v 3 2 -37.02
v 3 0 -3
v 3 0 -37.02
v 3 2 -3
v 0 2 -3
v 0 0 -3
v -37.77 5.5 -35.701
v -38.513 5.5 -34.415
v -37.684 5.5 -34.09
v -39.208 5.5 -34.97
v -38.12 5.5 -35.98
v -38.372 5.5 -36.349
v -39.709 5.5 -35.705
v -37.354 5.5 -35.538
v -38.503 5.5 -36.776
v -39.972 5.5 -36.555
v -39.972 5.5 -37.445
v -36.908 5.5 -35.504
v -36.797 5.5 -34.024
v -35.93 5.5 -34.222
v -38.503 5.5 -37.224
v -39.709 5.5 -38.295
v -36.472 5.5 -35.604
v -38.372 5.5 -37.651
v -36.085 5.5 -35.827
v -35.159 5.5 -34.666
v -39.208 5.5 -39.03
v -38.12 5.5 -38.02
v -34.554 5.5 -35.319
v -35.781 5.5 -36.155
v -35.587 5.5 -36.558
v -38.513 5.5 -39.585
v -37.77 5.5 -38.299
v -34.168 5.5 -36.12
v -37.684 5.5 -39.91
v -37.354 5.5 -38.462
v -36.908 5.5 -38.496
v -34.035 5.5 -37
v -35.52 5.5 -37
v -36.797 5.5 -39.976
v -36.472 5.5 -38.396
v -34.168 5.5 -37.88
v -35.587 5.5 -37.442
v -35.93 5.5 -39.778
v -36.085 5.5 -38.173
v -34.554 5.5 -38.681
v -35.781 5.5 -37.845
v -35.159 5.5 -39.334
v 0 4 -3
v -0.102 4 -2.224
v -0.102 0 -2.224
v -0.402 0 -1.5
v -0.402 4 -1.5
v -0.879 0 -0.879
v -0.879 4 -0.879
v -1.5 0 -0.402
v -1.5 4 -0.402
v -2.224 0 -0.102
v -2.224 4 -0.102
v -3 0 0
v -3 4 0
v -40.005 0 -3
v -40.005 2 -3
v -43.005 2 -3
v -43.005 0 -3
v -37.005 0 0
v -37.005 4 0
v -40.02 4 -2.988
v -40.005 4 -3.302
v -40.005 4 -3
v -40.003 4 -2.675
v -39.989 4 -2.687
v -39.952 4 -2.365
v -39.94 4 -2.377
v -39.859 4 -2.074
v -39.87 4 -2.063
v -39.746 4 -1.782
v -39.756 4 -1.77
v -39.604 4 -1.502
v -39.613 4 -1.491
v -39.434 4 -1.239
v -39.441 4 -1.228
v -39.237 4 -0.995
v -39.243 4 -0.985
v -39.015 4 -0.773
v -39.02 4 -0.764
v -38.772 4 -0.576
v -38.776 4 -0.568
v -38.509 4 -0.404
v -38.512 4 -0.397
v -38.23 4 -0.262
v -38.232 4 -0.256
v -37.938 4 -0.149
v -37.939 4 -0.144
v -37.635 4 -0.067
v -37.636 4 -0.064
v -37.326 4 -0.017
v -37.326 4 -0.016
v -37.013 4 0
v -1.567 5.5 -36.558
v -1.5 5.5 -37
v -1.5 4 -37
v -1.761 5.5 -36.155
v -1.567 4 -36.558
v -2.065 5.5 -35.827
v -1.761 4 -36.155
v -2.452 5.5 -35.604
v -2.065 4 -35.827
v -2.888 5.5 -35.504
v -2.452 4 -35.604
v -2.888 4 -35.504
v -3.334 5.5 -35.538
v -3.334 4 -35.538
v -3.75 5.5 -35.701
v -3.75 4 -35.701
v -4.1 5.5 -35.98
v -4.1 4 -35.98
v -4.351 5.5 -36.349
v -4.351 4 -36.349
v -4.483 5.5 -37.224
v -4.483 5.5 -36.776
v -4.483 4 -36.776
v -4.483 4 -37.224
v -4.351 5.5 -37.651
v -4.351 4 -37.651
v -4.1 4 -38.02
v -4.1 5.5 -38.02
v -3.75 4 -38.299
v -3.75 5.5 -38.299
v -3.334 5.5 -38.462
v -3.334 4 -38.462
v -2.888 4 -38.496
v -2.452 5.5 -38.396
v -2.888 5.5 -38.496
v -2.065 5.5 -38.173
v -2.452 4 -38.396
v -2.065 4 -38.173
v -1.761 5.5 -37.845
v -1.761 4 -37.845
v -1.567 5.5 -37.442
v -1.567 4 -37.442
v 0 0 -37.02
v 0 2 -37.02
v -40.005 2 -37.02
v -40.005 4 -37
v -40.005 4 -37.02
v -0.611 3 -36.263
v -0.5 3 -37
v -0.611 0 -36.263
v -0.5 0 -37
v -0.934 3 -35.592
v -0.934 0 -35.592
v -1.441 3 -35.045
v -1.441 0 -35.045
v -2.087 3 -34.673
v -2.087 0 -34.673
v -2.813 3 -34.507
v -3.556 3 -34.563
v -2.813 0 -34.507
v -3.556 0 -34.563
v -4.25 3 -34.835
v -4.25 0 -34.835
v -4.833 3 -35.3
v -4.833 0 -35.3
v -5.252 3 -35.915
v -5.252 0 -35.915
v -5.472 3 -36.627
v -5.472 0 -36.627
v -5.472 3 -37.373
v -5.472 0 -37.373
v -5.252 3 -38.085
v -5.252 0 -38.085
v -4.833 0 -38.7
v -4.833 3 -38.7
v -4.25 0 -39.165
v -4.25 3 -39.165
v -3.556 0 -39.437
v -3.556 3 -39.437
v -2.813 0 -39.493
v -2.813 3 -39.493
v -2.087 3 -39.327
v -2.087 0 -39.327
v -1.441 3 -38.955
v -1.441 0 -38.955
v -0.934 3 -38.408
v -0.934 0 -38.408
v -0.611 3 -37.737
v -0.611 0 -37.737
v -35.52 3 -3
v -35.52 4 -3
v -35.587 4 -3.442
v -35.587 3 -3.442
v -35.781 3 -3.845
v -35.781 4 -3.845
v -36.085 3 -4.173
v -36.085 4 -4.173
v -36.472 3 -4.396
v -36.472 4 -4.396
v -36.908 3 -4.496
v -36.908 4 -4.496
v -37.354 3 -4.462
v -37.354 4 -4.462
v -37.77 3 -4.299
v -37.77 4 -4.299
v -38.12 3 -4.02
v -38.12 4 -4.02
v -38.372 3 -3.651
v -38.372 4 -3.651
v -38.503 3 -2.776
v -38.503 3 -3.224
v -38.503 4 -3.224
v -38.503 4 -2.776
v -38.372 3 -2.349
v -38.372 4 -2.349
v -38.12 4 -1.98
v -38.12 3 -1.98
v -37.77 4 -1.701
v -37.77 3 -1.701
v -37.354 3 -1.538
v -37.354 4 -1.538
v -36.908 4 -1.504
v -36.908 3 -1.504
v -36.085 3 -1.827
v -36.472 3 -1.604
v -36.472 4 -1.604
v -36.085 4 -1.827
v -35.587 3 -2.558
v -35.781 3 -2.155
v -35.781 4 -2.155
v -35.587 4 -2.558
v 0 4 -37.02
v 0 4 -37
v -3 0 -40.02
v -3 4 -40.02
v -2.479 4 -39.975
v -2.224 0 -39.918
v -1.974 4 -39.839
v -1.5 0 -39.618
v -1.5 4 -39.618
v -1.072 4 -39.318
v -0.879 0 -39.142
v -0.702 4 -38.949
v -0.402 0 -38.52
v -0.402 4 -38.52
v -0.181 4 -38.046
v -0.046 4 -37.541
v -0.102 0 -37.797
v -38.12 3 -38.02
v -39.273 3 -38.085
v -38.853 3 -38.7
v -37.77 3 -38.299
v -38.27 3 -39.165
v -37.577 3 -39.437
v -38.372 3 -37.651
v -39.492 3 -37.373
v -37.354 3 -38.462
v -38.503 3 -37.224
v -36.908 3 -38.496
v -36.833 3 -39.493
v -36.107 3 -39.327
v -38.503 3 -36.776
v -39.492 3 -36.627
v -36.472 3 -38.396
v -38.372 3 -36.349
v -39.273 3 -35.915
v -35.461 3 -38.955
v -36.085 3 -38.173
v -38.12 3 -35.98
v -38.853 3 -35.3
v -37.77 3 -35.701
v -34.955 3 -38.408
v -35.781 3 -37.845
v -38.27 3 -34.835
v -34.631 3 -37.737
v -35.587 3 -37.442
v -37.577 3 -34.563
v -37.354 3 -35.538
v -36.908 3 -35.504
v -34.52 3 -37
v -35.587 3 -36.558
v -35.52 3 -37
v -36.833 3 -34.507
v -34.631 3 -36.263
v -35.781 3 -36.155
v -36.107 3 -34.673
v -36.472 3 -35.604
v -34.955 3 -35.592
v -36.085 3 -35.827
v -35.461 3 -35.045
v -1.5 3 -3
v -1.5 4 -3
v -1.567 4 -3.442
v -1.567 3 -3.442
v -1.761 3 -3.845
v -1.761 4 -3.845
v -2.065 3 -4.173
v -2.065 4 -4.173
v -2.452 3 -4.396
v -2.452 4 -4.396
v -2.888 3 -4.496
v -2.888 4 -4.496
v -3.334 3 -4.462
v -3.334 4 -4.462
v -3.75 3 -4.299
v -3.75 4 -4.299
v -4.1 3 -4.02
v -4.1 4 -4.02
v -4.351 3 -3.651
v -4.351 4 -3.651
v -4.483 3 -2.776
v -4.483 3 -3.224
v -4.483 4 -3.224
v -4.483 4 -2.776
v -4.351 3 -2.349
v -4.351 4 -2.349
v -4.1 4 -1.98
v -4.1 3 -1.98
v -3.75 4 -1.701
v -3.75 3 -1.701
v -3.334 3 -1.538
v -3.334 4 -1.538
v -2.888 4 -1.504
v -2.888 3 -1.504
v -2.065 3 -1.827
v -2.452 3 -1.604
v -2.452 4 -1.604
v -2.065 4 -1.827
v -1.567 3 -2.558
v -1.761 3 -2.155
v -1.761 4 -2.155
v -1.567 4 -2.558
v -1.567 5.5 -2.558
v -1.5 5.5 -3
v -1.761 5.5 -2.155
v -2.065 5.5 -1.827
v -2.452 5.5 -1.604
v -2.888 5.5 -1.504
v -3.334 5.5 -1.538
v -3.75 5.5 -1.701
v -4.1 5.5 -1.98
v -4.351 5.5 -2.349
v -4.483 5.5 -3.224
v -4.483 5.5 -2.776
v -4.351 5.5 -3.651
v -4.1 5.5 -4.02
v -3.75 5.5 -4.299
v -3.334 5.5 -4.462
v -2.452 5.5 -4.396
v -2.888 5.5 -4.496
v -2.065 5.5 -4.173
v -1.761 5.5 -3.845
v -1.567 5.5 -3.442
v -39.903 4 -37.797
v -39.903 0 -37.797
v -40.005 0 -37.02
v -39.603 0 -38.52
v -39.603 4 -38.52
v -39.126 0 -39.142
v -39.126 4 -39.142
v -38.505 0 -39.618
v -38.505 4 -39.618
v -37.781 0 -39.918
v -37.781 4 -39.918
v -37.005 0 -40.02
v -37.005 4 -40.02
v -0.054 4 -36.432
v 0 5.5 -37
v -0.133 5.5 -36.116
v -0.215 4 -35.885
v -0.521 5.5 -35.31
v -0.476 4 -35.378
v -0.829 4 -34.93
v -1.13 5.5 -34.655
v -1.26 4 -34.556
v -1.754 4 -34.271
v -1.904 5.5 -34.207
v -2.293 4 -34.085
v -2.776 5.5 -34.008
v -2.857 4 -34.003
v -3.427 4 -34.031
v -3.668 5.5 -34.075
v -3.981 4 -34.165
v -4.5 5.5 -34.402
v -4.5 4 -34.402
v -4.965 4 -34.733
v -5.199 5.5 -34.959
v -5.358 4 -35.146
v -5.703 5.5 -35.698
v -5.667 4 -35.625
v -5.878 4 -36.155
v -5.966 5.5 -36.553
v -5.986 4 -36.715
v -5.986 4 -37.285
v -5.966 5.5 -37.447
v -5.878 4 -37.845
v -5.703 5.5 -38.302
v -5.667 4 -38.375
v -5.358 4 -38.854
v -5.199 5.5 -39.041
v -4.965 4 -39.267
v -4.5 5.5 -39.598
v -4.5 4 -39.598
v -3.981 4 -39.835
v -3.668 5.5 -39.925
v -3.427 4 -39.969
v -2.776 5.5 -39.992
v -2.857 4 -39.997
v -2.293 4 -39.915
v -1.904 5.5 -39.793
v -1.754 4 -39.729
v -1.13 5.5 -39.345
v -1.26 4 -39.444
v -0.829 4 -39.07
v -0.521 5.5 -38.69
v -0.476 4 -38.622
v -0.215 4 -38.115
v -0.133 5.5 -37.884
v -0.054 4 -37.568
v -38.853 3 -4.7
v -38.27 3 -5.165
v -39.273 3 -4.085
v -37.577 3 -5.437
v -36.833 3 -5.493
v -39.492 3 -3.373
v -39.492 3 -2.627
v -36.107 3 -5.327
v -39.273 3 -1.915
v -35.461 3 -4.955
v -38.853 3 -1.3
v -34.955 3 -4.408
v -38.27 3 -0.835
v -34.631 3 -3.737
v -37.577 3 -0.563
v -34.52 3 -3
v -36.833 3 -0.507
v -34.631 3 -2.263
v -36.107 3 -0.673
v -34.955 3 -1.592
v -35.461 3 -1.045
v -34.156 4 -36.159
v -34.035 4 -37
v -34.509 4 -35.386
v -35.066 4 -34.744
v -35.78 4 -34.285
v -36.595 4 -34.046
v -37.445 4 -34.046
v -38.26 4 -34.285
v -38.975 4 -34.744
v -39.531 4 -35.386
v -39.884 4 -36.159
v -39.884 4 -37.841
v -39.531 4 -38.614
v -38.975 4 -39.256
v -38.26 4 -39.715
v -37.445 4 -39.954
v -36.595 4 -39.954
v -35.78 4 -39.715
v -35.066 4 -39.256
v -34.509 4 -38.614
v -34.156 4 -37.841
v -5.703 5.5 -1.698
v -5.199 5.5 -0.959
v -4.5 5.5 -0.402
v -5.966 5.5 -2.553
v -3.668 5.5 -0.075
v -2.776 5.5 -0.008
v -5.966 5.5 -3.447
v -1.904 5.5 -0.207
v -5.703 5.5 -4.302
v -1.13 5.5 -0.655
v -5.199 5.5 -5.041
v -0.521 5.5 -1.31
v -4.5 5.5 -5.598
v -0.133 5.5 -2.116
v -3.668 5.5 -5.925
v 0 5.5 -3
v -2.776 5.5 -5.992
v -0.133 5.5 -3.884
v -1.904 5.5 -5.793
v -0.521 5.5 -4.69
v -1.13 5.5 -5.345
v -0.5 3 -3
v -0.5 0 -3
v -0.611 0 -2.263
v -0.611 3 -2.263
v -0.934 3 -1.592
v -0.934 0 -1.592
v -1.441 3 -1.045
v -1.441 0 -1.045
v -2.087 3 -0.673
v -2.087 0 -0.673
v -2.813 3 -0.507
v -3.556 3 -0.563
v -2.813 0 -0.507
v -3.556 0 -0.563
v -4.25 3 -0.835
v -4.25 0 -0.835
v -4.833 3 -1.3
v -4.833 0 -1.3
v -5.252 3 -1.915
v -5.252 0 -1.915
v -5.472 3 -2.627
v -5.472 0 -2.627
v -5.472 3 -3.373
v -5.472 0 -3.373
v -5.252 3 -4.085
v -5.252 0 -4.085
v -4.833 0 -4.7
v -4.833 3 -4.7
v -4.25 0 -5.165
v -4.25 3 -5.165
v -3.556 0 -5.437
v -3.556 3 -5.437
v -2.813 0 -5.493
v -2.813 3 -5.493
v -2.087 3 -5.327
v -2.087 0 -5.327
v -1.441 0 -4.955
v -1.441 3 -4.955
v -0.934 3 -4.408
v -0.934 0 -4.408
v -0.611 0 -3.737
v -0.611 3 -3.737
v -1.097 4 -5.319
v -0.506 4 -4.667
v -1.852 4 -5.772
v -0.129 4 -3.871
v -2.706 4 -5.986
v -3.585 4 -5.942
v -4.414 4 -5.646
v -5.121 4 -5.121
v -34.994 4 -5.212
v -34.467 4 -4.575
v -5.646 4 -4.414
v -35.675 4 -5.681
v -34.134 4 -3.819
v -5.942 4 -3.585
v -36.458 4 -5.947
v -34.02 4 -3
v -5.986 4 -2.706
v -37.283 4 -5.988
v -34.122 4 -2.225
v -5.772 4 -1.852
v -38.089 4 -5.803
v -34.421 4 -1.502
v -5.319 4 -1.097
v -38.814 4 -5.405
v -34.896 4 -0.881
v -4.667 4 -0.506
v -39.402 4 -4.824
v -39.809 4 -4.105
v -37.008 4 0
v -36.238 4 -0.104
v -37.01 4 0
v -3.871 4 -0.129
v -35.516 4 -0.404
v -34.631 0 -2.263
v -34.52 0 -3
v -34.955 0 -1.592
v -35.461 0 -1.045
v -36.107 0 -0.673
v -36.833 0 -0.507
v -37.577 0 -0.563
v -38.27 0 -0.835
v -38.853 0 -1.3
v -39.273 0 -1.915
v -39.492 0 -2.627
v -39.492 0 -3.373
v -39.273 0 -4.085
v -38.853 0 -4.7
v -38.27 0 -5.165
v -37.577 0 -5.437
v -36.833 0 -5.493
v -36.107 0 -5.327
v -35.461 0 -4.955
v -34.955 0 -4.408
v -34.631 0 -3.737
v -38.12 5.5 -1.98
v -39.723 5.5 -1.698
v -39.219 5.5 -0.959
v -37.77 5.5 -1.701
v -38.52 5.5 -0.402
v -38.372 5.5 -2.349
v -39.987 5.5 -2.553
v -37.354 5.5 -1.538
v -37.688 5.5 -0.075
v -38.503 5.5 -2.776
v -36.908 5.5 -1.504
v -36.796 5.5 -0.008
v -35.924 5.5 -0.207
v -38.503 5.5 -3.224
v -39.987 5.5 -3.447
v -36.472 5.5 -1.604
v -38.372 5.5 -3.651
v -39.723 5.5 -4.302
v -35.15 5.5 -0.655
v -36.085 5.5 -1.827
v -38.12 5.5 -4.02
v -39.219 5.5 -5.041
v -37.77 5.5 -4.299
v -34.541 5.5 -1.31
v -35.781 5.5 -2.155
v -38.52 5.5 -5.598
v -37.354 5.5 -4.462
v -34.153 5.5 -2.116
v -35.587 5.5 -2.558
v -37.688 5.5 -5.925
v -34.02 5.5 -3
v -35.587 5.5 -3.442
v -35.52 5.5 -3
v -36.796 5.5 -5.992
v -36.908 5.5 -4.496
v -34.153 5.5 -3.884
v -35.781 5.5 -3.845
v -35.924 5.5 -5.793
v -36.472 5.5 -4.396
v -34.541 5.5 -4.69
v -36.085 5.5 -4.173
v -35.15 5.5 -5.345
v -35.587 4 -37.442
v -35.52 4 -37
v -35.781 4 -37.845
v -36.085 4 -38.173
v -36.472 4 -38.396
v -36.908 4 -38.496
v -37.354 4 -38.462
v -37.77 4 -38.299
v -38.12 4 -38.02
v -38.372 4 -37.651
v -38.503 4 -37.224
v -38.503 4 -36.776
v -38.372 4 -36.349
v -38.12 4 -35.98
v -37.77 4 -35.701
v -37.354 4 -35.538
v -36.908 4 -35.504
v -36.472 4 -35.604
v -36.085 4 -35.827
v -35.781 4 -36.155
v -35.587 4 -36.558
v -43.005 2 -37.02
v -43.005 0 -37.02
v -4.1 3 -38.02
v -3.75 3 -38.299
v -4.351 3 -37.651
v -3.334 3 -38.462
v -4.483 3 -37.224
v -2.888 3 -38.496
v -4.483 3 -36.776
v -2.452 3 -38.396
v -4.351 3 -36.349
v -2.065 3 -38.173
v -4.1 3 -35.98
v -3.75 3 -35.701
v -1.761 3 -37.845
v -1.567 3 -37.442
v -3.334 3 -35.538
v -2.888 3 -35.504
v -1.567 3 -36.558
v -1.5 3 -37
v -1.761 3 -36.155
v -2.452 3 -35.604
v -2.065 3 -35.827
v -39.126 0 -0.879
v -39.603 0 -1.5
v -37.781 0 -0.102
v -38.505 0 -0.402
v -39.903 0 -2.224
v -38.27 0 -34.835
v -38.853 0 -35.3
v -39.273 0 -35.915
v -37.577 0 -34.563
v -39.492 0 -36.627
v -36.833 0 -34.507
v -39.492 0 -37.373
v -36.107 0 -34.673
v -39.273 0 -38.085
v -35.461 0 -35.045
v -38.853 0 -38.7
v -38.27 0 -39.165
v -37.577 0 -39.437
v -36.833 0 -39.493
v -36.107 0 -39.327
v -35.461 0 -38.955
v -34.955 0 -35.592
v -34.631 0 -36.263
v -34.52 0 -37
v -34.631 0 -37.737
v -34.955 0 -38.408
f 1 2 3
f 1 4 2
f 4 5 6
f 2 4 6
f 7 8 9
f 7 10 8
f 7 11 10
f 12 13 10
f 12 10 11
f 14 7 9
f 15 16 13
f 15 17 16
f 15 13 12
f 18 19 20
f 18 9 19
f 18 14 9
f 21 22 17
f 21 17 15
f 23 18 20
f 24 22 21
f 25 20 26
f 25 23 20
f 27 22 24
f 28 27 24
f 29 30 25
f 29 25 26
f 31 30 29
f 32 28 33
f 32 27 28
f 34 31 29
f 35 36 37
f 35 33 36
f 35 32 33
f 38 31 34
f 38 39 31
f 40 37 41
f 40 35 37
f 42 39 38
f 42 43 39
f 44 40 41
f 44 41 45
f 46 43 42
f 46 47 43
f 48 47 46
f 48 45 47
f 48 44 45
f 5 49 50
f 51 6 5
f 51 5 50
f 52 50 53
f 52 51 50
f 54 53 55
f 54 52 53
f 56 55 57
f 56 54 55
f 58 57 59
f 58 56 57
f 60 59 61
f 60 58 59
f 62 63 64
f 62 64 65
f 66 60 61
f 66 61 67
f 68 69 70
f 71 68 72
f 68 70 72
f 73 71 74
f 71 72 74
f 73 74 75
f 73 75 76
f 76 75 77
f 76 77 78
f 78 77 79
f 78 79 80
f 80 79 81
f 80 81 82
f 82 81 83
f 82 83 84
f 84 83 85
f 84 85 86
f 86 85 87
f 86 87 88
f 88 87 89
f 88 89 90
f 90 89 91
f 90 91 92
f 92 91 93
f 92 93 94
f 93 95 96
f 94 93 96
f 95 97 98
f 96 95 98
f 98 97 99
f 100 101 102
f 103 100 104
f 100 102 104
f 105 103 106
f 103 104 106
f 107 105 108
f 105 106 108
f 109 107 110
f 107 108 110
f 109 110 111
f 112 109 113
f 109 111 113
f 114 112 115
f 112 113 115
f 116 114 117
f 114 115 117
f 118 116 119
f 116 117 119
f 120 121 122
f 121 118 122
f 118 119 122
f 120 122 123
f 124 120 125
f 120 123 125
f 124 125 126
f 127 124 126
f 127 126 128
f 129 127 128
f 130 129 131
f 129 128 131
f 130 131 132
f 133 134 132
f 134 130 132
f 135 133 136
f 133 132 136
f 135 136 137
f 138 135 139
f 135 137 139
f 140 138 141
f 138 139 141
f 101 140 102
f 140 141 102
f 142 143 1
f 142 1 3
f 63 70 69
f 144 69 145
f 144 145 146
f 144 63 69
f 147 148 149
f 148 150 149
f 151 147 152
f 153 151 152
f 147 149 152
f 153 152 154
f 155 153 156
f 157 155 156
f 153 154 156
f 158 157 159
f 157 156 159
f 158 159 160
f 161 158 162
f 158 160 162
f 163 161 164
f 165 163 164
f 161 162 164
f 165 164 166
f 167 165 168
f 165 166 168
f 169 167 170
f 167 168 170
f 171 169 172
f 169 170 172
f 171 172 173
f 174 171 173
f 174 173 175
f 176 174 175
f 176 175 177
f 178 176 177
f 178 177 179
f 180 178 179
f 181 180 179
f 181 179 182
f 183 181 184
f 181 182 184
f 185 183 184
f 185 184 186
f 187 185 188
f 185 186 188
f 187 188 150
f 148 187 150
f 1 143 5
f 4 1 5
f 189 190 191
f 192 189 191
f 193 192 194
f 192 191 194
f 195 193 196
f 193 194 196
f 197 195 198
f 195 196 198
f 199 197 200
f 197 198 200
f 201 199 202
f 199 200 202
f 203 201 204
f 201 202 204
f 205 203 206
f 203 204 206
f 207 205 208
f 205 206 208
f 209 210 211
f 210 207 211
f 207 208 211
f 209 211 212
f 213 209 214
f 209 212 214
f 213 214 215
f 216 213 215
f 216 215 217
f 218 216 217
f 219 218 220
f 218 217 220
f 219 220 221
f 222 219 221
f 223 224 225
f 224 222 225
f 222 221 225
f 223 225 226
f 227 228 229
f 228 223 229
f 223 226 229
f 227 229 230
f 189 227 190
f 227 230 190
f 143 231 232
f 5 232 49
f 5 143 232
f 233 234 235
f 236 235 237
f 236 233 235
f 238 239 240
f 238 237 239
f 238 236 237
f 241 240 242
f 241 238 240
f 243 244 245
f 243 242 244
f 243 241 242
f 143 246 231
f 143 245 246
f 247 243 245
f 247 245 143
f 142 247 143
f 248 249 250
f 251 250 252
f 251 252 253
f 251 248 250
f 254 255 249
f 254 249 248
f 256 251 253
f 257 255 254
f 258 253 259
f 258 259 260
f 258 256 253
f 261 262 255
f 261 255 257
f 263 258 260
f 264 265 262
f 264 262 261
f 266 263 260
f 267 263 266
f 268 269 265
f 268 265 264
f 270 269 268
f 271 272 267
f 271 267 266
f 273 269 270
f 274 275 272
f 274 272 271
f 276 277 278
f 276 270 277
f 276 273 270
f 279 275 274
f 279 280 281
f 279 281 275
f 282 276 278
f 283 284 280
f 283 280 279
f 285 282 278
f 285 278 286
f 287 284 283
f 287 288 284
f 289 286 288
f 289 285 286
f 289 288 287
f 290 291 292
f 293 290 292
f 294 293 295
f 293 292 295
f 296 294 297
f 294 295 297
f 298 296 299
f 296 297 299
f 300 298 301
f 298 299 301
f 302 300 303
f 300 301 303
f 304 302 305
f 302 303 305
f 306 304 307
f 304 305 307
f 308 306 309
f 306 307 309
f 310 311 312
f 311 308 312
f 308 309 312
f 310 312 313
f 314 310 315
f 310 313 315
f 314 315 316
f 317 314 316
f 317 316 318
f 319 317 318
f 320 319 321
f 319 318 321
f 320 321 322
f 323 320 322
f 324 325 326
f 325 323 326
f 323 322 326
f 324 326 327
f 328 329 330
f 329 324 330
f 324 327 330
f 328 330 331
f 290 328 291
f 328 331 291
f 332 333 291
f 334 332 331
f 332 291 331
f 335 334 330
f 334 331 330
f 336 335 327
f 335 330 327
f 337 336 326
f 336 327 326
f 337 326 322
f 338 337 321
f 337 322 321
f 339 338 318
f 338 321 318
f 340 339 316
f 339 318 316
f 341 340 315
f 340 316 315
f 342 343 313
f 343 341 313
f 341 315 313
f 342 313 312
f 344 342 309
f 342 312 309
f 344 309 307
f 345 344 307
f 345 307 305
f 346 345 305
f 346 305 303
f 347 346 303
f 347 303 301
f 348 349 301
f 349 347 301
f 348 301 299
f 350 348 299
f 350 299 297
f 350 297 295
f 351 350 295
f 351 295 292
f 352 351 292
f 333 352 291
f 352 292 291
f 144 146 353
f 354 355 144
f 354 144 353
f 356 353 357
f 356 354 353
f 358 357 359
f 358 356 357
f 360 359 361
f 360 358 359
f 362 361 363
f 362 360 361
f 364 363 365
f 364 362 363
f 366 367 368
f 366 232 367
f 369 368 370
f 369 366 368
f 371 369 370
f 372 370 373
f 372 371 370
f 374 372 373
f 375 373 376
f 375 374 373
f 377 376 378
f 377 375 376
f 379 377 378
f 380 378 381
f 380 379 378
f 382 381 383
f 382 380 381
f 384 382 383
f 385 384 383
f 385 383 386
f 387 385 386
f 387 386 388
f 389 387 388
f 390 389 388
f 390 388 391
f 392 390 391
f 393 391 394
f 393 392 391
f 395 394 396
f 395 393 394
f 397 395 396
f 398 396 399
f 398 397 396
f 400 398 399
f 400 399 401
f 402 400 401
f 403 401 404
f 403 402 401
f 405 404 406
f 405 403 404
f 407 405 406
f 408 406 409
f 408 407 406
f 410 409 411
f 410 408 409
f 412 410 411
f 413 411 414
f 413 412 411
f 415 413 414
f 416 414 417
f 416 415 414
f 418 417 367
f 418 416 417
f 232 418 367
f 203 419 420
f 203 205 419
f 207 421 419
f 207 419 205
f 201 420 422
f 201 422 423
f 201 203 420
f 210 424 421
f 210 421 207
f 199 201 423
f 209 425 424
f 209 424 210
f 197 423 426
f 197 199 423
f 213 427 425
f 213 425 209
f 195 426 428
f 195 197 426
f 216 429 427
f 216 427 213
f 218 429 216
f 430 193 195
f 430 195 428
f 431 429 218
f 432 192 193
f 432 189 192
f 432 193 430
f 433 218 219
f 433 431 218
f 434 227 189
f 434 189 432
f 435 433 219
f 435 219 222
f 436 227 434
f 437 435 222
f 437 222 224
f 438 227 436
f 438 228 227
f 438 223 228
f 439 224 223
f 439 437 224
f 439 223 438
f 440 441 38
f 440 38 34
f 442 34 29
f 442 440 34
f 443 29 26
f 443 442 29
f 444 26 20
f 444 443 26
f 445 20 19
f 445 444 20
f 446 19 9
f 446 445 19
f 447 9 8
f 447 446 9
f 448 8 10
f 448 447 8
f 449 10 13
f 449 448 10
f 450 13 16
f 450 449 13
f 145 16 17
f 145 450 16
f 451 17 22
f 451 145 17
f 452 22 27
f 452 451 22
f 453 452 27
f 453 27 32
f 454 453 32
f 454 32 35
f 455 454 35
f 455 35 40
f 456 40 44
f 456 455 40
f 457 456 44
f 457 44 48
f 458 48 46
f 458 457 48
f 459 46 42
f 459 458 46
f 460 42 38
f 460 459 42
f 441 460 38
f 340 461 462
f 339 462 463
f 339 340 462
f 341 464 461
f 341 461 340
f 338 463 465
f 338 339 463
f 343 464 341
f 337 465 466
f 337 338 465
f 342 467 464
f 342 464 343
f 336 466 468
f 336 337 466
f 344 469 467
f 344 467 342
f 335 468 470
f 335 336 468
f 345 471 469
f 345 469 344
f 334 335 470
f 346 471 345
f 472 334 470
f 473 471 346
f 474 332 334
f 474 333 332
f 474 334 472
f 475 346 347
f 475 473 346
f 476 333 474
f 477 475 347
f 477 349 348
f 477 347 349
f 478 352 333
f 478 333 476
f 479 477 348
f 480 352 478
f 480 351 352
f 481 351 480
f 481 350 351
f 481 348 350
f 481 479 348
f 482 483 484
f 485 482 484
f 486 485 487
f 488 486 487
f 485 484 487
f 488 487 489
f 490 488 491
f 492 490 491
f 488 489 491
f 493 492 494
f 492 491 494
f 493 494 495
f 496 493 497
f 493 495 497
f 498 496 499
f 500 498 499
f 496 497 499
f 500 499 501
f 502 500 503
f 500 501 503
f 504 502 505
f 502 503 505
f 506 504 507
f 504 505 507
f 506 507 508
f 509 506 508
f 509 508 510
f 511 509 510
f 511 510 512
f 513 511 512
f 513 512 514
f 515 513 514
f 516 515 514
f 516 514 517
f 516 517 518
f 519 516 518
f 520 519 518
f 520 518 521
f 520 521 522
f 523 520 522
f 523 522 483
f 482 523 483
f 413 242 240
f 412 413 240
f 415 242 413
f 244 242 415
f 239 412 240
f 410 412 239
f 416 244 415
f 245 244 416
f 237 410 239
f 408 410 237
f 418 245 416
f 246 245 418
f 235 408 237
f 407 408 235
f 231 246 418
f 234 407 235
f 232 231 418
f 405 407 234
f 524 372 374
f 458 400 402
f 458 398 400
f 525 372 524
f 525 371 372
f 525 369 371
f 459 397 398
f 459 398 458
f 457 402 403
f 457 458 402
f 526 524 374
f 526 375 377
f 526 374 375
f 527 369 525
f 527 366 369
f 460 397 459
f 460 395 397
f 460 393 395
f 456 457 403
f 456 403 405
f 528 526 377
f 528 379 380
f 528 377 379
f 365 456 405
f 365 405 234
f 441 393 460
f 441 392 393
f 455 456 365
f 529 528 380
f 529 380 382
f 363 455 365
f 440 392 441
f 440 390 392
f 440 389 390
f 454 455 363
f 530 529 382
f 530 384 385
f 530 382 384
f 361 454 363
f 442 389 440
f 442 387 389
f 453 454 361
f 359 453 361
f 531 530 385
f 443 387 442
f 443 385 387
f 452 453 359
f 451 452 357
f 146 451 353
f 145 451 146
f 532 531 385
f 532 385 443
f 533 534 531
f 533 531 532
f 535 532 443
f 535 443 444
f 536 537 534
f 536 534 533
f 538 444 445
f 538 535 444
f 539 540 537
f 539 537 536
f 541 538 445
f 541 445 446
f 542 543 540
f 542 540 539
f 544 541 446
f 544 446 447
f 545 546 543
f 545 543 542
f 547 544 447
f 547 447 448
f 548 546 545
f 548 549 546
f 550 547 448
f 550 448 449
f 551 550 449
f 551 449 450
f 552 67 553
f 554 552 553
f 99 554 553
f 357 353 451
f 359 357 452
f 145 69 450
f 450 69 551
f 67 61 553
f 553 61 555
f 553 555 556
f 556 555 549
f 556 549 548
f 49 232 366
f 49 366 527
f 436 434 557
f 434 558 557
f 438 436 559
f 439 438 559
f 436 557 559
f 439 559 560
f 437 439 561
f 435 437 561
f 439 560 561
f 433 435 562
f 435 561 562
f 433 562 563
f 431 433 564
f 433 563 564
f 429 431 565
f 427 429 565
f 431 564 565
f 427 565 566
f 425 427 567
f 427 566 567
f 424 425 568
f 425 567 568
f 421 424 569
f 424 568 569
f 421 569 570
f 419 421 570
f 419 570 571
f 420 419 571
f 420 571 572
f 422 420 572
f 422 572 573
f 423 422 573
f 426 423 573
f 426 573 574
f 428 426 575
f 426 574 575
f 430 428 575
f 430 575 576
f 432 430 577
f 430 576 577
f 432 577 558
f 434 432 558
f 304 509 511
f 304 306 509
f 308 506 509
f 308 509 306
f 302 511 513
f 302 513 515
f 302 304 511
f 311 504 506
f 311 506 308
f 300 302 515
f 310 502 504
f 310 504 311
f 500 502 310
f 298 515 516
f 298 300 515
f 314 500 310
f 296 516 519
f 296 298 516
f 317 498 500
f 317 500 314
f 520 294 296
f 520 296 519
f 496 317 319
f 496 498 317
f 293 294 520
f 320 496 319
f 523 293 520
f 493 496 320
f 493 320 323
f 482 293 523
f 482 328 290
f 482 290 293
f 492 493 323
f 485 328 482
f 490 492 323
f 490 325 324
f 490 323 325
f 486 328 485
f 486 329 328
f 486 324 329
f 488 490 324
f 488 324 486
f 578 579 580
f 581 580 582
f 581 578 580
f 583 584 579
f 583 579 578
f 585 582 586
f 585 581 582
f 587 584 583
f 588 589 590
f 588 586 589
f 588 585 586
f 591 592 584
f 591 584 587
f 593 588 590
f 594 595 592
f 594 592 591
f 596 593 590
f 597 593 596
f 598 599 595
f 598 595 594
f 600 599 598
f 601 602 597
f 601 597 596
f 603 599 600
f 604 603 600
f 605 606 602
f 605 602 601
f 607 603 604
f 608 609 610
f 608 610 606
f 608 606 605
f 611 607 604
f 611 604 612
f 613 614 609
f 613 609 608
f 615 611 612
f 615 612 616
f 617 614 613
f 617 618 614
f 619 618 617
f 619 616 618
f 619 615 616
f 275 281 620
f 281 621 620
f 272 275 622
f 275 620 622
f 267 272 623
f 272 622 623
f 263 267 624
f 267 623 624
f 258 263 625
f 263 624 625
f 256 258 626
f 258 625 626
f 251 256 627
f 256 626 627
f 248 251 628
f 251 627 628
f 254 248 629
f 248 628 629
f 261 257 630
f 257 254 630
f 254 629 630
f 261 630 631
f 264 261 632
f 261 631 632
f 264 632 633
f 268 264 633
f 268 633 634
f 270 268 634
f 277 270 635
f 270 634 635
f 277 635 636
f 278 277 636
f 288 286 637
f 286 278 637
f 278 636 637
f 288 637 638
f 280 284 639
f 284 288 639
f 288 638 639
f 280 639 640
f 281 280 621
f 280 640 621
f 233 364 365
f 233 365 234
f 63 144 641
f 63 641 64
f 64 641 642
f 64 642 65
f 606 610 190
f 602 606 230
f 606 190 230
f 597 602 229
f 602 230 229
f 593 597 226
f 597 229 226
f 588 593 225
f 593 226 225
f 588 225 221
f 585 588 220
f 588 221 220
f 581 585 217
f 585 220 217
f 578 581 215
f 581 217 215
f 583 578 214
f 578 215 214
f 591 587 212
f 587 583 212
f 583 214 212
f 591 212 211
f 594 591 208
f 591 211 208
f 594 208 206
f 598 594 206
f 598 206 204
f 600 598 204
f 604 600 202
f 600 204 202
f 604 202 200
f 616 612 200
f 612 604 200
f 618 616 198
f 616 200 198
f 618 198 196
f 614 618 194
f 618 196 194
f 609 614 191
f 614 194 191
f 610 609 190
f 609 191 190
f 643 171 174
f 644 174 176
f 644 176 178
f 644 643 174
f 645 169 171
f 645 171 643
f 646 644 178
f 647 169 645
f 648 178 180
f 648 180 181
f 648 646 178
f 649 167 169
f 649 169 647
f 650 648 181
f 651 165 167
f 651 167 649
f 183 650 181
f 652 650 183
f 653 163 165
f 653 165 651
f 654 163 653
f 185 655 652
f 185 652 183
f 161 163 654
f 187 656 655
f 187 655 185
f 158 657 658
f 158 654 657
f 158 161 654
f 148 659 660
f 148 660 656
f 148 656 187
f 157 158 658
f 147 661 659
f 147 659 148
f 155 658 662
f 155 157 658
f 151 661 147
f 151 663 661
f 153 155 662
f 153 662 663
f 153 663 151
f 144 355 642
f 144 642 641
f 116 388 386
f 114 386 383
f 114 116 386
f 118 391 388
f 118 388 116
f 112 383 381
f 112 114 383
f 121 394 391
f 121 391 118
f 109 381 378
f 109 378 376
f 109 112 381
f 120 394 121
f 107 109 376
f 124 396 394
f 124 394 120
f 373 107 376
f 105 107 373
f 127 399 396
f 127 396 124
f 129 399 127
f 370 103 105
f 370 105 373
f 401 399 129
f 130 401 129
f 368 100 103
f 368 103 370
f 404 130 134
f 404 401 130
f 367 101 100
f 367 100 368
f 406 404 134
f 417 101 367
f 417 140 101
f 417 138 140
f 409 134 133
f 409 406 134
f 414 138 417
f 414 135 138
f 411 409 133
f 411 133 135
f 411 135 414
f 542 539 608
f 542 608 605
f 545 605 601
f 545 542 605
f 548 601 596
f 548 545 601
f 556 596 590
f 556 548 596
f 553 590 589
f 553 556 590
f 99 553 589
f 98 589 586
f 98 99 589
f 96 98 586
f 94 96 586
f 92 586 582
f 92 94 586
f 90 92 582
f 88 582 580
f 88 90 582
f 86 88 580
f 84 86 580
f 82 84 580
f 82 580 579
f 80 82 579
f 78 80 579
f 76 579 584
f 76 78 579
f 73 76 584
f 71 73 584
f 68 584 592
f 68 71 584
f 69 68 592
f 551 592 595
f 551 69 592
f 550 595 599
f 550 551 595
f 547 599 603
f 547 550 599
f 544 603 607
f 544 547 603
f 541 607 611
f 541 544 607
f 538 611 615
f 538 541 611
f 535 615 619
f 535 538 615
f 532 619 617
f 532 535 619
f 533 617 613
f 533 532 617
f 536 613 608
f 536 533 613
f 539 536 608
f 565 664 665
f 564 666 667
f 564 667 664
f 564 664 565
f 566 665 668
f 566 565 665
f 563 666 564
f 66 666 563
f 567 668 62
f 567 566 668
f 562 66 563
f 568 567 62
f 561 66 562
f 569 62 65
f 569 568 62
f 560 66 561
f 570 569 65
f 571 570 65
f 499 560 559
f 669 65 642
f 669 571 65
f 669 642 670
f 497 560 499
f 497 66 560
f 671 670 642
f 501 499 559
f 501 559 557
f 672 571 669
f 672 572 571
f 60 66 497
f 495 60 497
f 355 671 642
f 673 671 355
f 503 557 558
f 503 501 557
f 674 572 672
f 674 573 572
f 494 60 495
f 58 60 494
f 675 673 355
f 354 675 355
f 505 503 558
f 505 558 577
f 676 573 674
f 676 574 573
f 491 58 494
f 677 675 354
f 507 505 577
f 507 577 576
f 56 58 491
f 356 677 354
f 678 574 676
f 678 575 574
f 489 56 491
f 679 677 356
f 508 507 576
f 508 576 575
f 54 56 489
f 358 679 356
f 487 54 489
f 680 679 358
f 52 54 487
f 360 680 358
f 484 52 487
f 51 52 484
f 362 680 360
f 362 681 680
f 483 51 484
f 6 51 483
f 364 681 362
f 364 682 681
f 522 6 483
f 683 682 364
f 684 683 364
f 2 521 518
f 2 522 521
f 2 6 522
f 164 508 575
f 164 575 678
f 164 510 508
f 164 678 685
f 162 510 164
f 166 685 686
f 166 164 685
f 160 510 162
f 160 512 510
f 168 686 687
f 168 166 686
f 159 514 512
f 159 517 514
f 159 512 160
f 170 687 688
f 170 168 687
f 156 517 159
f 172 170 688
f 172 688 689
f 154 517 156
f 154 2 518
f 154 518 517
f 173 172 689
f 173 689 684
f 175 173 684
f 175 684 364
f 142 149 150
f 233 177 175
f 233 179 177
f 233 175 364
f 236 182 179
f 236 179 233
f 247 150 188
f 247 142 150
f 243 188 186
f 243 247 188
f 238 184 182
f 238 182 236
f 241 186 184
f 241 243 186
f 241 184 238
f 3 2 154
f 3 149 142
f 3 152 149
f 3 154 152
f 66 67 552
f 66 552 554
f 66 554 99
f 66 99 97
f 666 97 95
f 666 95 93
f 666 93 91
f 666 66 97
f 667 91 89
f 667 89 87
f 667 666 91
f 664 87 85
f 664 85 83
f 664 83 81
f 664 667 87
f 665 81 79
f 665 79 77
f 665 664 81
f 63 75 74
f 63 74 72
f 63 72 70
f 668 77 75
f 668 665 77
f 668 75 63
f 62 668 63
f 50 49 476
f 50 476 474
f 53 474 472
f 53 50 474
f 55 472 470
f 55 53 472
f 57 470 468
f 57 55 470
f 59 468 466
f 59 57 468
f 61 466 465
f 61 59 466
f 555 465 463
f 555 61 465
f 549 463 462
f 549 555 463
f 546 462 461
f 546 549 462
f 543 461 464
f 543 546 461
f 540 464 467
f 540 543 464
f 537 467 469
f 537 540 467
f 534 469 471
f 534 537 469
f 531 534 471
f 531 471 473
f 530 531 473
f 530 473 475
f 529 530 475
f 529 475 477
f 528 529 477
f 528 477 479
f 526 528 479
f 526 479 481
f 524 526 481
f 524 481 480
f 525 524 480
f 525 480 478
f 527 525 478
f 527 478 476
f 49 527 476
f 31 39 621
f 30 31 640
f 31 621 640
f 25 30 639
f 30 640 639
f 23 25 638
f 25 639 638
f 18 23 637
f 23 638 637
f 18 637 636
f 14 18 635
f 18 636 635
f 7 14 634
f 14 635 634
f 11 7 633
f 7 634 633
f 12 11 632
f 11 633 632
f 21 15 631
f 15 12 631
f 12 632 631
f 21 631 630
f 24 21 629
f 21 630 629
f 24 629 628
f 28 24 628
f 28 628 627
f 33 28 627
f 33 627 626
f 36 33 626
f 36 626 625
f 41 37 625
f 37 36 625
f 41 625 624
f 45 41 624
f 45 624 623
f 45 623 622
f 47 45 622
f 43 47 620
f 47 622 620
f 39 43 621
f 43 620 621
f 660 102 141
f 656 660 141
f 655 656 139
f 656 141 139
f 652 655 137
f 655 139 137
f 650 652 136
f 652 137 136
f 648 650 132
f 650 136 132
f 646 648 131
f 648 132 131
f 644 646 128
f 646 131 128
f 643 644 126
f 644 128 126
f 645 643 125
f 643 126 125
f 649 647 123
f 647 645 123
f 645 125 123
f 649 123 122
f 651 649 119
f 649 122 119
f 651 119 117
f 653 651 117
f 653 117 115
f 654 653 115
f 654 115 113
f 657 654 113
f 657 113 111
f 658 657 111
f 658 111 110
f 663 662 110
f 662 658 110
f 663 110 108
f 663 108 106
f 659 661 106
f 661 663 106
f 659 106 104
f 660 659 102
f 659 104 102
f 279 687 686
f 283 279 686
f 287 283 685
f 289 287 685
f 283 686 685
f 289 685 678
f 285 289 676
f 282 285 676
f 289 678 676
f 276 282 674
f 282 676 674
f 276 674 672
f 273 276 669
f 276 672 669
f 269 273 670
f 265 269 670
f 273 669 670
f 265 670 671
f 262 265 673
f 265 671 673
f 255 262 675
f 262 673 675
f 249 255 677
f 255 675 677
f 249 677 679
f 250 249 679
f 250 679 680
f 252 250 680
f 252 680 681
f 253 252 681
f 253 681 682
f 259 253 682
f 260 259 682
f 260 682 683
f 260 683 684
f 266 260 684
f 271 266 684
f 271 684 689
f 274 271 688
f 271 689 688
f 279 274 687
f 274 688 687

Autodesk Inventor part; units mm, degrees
ref_plane "YZ Plane" through (0, 0, 0) normal (1, 0, 0) x (0, 1, 0)
ref_plane "XZ Plane" through (0, 0, 0) normal (0, 1, 0) x (-1, 0, 0)
ref_plane "XY Plane" through (0, 0, 0) normal (0, 0, 1) x (1, 0, 0)
sketch "Sketch1" plane through (0, 0, 0) normal (0, 1, 0) x (-1, 0, 0)
  line L0 (0, 0) -> (40.005, 0)
  line L1 (40.005, 0) -> (40.005, -40.0202)
  line L2 (40.005, -40.0202) -> (0, -40.0202)
  line L3 (0, -40.0202) -> (0, 0)
  dimension "d26" = 40.005
  dimension "d27" = 40.0202
extrude "Extrusion1" add sketch "Sketch1" along normal blind 4
sketch "Sketch2" plane through (0, 4, 0) normal (0, 1, 0) x (1, 0, 0)
  line L0 (-40.0202, 0) -> (0, 0) projected
  line L1 (0, 0) -> (0, 40) projected
  line L2 (0, 40) -> (-40.0202, 40) projected
  line L3 (-40.0202, 40) -> (-40.0202, 0) projected
  line L4 (-37.0202, 37) -> (-3, 37)
  line L5 (-3, 37) -> (-3, 3)
  line L6 (-3, 3) -> (-37.0202, 3)
  line L7 (-37.0202, 3) -> (-37.0202, 37)
  circle A0 centre (-37.0202, 37) radius 1.5
  circle A1 centre (-3, 37) radius 1.5
  circle A2 centre (-3, 3) radius 1.5
  circle A3 centre (-37.0202, 3) radius 1.5
  dimension "d4" = 3
  dimension "d5" = 3
  dimension "d6" = 3
  dimension "d7" = 3
  dimension "d8" = 3
extrude "Extrusion2" cut sketch "Sketch2" against normal blind 4 contours L7 A0 L4 | L4 A0 L7 | A1 L5 L4 | L4 L5 A1 | A3 L6 L7 | L7 L6 A3 | A2 L6 L5 | L5 L6 A2
sketch "Sketch3" plane through (0, 4, 0) normal (0, 1, 0) x (1, 0, 0)
  circle A0 centre (-37.0202, 3) radius 1.5 projected
  circle A1 centre (-37.0202, 37) radius 1.5 projected
  circle A2 centre (-3, 37) radius 1.5 projected
  circle A3 centre (-3, 3) radius 1.5 projected
  circle A4 centre (-37.0202, 3) radius 1.5 projected
  circle A5 centre (-3, 37) radius 1.5 projected
  circle A6 centre (-37.0202, 37) radius 1.5 projected
  circle A7 centre (-3, 3) radius 1.5 projected
  line L0 (-40.005, 0) -> (0, 0) projected
  line L1 (0, 0) -> (0, 40.0202) projected
  line L2 (0, 40.0202) -> (-40.005, 40.0202) projected
  line L3 (-40.005, 40.0202) -> (-40.005, 0) projected
  circle A8 centre (-3, 37) radius 3
  circle A9 centre (-3, 3) radius 3
  circle A10 centre (-37.0202, 3) radius 3
  circle A11 centre (-37.0202, 37) radius 2.9848
extrude "Extrusion3" add sketch "Sketch3" along normal blind 1.5 contours A8 | A11 | A10 L3 | A10 L3 | A9
sketch "Sketch4" plane through (0, 0, 0) normal (0, -1, 0) x (1, 0, 0)
  circle A0 centre (-3, -37) radius 1.5 projected
  circle A1 centre (-37.0202, -37) radius 1.5 projected
  circle A2 centre (-37.0202, -3) radius 1.5 projected
  circle A3 centre (-3, -3) radius 1.5 projected
  circle A4 centre (-3, -3) radius 2.5
  circle A5 centre (-3, -37) radius 2.5
  circle A6 centre (-37.0202, -37) radius 2.5
  circle A7 centre (-37.0202, -3) radius 2.5
  point P0 (0, 0)
  dimension "d14" = 5
  dimension "d15" = 5
  dimension "d16" = 5
  dimension "d17" = 5
extrude "Extrusion4" cut sketch "Sketch4" against normal blind 3
fillet "Fillet2" radius 3 4 edges at (-40.005, 2, -40.0202) (-40.005, 2, 0) (0, 2, 0) (0, 2, -40.0202)
sketch "Sketch7" plane through (0, 0, -3) normal (1, 0, 0) x (0, 0, -1)
  line L0 (34.0202, 4) -> (34.0202, 0) projected
  line L1 (0, 0) -> (34.0202, 0)
  line L2 (34.0202, 0) -> (34.0202, 2)
  line L3 (34.0202, 2) -> (0, 2)
  line L4 (0, 2) -> (0, 0)
  point P0 (-3, 0)
  dimension "d29" = 2
extrude "Extrusion7" add sketch "Sketch7" along normal blind 3
sketch "Sketch8" plane through (-40.005, 4, -37) normal (-1, 0, 0) x (0, 0, 1)
  line L0 (34, -4) -> (-0.0202, -4) projected
  line L1 (-0.0202, -4) -> (-0.0202, -2) projected
  line L2 (-0.0202, -2) -> (34, -2) projected
  line L3 (34, -2) -> (34, -4) projected
  point P0 (37, -4)
extrude "Extrusion8" add sketch "Sketch8" along normal blind 3
properties part number "L298N-holder"
